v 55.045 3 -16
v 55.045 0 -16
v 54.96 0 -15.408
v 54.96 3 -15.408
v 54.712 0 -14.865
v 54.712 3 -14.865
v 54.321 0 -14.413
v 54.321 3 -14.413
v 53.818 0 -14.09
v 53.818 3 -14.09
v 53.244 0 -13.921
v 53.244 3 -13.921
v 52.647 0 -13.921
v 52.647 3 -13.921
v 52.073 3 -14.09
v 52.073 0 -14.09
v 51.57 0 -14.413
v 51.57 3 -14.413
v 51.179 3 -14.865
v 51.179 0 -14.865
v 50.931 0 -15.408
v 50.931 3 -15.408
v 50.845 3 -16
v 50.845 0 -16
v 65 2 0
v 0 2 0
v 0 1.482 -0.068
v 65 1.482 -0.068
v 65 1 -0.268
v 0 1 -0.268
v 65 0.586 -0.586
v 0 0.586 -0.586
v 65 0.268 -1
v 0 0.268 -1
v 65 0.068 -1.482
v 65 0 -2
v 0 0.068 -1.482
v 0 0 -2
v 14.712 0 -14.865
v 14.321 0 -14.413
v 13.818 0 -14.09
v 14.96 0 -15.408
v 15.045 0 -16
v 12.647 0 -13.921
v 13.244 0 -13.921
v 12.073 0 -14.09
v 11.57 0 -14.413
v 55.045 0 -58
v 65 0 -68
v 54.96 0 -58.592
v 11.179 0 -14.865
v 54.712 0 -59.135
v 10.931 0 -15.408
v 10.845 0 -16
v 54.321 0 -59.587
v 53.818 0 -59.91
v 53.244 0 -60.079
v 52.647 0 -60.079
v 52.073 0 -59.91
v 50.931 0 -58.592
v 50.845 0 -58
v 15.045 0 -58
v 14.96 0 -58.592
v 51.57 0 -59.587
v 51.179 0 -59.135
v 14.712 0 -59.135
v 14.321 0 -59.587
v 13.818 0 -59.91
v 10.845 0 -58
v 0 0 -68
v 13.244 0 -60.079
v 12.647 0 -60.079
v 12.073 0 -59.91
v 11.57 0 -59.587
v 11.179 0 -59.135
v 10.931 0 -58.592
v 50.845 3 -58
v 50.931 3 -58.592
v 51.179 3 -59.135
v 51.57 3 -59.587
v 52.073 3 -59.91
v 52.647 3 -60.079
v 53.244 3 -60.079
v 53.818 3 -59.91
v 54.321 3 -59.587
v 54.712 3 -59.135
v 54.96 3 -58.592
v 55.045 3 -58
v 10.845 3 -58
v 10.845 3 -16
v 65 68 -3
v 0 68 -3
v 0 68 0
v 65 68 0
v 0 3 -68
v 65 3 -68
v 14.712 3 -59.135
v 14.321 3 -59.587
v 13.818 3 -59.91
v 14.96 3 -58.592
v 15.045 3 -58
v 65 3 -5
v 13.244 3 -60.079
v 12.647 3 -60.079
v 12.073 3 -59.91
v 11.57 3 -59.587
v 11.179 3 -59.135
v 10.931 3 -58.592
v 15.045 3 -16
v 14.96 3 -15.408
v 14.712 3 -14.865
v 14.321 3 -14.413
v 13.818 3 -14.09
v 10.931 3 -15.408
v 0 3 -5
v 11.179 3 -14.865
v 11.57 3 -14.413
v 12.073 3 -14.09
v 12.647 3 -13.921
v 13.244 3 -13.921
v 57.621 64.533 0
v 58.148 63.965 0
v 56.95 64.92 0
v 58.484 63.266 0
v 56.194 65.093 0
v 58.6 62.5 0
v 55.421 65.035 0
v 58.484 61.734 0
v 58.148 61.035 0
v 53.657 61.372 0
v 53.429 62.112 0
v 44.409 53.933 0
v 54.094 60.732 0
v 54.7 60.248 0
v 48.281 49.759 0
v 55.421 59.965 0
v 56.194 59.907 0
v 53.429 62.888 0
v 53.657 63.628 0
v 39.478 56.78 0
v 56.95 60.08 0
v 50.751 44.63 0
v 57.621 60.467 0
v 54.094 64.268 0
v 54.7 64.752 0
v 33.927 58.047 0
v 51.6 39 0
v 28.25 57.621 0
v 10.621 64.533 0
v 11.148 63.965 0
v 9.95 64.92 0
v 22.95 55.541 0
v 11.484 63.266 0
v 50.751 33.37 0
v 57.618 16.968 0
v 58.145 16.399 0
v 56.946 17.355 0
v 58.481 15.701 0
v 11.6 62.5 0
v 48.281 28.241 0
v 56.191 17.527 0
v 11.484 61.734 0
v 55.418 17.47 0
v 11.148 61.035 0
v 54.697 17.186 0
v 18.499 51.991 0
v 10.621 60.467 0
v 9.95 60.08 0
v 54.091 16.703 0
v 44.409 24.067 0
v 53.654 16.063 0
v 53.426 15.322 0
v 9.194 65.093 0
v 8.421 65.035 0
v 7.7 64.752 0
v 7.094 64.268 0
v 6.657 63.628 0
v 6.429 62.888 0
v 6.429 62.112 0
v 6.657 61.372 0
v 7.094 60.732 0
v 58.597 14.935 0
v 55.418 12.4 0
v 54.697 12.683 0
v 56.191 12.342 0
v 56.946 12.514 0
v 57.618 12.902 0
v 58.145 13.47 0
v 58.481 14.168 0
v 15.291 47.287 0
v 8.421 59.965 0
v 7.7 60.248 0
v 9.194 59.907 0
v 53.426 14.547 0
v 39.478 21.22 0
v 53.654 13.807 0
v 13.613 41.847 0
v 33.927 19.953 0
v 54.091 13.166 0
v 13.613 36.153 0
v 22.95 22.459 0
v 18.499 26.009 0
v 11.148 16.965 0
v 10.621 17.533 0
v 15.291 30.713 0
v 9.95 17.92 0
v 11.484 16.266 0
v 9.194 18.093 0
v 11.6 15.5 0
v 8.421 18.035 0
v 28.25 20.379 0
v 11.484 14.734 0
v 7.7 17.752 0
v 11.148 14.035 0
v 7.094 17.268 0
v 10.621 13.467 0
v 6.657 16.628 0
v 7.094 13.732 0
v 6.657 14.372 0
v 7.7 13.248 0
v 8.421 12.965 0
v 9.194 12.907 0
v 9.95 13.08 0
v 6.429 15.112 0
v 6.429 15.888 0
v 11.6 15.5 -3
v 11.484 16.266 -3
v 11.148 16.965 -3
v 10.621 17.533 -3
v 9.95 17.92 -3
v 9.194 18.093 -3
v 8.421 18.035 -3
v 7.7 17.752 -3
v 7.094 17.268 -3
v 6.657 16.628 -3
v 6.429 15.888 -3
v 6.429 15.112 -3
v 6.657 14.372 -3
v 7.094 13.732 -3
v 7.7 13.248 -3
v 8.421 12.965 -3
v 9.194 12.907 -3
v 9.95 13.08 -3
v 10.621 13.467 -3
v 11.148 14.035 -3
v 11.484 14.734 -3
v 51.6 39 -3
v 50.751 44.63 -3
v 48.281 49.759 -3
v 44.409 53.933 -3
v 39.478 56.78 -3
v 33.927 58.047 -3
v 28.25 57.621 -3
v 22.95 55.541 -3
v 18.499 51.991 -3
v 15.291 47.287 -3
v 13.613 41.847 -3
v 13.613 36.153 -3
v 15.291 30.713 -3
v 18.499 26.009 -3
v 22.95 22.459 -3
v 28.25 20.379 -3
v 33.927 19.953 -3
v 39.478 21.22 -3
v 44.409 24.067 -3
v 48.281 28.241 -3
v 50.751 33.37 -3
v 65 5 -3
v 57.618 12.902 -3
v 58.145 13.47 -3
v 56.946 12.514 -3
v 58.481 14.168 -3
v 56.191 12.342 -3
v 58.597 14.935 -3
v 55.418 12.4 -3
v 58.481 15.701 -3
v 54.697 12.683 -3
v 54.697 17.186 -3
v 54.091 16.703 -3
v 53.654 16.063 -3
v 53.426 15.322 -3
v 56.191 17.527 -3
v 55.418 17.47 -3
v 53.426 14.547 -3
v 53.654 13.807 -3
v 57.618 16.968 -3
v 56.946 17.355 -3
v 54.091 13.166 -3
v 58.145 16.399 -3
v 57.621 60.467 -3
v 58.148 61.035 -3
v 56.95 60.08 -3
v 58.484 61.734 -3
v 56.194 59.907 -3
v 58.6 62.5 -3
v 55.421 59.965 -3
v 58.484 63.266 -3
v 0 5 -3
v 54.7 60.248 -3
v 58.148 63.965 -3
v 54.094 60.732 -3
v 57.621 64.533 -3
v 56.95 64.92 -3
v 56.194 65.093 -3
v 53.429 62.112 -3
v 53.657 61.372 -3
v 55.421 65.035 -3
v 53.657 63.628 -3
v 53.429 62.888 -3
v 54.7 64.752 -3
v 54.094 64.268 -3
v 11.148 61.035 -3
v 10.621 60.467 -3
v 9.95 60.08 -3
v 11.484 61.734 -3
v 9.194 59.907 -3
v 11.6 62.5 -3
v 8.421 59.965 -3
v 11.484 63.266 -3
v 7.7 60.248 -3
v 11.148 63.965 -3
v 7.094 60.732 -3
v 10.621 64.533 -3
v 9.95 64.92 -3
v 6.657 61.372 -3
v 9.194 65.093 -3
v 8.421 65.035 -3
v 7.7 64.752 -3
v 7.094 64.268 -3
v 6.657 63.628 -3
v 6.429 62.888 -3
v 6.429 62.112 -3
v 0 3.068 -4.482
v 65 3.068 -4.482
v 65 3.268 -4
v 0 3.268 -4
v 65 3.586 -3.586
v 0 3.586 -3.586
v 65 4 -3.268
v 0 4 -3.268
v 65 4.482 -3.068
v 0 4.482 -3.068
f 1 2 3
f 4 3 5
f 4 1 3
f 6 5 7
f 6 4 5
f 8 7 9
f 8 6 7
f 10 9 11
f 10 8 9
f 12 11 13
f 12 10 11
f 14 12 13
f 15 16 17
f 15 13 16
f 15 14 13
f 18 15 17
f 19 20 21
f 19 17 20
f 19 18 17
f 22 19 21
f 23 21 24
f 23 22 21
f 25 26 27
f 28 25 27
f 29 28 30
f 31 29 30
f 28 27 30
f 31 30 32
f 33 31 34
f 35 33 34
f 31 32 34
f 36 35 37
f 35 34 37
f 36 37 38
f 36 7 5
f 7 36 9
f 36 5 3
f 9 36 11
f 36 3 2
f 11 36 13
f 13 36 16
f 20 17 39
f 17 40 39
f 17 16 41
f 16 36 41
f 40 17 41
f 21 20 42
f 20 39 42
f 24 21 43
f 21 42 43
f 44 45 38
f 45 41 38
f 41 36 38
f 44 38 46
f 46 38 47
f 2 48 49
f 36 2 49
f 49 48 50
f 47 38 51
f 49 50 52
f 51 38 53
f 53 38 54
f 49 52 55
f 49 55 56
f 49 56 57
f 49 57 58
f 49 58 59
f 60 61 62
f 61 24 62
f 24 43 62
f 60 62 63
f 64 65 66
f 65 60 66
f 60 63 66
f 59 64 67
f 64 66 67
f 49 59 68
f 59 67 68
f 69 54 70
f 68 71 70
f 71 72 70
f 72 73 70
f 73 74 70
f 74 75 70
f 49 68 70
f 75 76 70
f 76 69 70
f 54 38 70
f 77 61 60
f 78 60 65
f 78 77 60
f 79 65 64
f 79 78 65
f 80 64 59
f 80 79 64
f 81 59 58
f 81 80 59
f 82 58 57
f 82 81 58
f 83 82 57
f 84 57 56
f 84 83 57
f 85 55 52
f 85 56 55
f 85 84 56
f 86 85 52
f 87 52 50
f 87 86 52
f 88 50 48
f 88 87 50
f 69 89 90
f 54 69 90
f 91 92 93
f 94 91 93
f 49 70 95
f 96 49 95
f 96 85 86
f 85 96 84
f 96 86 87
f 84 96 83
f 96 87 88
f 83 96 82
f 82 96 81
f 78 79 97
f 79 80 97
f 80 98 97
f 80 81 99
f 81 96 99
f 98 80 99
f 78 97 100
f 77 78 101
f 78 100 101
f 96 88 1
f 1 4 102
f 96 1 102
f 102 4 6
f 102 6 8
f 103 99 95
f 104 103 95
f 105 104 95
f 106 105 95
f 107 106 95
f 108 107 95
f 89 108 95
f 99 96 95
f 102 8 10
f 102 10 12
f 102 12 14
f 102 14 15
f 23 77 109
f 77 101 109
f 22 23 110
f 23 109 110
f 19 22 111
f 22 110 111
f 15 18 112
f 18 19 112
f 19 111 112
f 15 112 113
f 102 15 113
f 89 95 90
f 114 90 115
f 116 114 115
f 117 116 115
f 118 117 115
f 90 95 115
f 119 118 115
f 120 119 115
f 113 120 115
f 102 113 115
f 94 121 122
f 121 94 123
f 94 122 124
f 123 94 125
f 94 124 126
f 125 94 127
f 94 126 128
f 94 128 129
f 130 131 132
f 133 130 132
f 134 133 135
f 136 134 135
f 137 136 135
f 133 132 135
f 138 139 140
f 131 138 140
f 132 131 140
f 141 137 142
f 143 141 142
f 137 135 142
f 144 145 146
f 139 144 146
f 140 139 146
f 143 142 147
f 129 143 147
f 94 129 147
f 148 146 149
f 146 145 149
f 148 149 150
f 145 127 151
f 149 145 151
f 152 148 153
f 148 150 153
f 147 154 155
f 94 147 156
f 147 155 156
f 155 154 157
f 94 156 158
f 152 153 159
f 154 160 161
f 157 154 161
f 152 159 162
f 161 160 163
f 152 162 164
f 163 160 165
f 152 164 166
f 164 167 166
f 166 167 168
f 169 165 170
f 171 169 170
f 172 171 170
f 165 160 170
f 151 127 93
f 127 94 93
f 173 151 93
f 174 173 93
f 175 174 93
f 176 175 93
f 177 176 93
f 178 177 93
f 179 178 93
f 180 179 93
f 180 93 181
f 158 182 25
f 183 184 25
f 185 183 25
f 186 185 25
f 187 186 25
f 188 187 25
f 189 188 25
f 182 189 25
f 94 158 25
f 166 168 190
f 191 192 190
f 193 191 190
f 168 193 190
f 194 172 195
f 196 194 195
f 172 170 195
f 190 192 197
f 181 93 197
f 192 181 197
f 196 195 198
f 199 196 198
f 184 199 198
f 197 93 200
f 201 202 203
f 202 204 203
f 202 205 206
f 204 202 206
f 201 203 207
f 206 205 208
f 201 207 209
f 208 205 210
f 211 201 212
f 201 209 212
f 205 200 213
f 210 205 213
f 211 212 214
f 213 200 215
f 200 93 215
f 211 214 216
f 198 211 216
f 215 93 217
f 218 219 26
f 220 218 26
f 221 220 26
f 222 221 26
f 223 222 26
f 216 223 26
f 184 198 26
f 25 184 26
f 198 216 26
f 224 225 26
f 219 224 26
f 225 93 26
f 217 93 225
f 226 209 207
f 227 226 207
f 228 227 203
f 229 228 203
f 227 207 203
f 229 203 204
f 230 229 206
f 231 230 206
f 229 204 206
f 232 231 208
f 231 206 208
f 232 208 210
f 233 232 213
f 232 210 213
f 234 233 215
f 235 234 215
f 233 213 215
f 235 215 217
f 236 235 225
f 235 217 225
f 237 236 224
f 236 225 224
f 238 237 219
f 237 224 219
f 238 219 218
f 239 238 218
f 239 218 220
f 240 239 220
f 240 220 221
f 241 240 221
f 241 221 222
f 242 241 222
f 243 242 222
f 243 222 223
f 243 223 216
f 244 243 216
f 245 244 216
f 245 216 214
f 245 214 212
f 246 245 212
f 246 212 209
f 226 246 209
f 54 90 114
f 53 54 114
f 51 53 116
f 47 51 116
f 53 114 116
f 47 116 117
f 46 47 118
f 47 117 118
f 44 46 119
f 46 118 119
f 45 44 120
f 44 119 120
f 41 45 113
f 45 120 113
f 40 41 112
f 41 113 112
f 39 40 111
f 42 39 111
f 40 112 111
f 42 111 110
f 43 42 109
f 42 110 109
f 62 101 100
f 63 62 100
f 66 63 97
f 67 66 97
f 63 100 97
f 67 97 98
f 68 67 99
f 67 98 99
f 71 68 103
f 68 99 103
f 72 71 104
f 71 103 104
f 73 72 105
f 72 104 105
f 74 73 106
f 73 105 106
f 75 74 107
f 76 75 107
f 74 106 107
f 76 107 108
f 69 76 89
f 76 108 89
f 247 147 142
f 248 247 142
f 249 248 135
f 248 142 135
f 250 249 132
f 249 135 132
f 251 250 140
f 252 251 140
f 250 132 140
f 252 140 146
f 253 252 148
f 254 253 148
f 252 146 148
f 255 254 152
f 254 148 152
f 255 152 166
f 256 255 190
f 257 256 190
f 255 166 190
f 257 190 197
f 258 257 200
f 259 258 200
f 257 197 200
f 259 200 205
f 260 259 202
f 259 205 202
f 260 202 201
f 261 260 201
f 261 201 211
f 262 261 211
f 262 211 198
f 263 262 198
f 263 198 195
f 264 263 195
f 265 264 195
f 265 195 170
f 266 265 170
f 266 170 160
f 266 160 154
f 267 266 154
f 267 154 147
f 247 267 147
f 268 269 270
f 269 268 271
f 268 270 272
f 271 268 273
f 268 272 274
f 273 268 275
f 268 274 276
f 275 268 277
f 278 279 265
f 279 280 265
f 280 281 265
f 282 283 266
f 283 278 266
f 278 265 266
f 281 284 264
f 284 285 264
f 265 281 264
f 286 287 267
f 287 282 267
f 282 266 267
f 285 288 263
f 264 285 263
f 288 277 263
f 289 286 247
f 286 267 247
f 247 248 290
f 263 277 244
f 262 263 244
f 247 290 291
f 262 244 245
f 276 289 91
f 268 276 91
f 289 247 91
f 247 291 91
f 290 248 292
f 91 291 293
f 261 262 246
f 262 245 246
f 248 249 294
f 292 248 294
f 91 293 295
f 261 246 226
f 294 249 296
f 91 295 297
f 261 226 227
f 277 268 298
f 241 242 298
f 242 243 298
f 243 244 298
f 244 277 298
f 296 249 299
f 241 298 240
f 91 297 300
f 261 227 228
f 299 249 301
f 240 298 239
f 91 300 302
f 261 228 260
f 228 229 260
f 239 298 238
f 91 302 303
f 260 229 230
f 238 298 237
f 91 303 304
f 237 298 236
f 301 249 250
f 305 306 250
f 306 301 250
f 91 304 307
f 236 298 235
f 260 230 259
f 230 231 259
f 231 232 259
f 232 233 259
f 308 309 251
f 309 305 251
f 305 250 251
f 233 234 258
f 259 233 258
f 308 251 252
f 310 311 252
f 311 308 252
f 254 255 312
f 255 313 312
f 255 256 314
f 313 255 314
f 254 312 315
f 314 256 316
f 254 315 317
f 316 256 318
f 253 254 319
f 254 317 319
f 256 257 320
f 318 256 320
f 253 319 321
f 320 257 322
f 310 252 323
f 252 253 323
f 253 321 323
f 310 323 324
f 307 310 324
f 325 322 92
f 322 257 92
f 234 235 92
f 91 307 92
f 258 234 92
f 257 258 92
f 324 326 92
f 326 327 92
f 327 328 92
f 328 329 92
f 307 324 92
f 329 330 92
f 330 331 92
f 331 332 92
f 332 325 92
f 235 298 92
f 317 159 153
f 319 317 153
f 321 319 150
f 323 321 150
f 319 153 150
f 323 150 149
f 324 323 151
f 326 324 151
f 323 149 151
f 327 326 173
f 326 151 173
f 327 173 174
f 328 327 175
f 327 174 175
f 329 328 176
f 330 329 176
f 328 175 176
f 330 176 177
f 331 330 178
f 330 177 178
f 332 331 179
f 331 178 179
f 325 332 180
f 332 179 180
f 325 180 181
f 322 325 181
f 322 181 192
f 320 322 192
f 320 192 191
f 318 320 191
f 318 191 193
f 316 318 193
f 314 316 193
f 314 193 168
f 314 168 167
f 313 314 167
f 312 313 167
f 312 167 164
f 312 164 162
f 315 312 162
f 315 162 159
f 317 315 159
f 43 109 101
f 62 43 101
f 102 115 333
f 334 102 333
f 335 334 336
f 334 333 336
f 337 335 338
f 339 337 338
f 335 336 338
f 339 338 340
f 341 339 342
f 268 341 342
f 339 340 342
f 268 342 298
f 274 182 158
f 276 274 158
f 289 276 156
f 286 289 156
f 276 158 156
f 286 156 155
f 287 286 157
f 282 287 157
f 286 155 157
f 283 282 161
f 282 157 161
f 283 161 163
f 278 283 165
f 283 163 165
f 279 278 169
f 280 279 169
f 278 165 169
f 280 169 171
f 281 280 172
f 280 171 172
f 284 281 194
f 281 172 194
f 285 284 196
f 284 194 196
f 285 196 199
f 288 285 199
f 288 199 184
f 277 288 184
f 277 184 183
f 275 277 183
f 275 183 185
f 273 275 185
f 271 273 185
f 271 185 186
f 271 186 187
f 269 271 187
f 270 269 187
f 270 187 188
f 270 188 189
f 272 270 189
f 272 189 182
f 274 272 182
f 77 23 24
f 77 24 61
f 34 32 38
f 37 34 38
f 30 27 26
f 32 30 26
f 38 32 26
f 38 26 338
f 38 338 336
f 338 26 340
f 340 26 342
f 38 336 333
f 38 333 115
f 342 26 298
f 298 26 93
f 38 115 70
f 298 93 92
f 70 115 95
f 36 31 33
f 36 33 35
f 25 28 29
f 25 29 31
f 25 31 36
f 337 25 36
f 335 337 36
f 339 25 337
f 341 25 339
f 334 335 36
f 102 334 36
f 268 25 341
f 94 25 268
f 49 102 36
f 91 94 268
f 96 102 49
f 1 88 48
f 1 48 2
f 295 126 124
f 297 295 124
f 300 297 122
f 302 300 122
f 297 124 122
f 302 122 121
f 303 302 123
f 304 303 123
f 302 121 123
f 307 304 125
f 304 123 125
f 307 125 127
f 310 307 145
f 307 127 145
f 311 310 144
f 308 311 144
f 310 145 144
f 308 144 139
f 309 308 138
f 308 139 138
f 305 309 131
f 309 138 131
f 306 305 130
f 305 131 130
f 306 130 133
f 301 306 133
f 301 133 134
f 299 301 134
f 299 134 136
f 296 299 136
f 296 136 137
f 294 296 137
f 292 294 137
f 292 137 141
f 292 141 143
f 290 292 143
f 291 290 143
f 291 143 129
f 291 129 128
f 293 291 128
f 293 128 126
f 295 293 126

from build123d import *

# Parameters (mm, degrees)
EXTRUDE_1_DEPTH     = 65
CUT_EXTRUDE_1_DEPTH = 115.341593482
SKETCH_3_R          = 19.1
SKETCH_3_R_2        = 2.6
CUT_EXTRUDE_2_DEPTH = 117.073252733


with BuildPart() as part:
    # Эскиз1 → Бобышка-Вытянуть1 (new body)
    with BuildSketch(Plane(origin=(0, 0, 0), x_dir=(0, 0, -1), z_dir=(1, 0, 0))):
        with BuildLine():
            Line((0, 68), (0, 2))
            ThreePointArc((0, 2), (0.585786438, 0.585786438), (2, 0))
            Line((2, 0), (68, 0))
            Line((68, 0), (68, 3))
            Line((68, 3), (5, 3))
            ThreePointArc((5, 3), (3.585786438, 3.585786438), (3, 5))
            Line((3, 5), (3, 68))
            Line((3, 68), (0, 68))
        make_face()
    extrude(amount=EXTRUDE_1_DEPTH)

    # Эскиз2 → Вырез-Вытянуть1 (cut, through all)
    with BuildSketch(Plane(origin=(0, 3, 0), x_dir=(1, 0, 0), z_dir=(0, 1, 0))):
        with BuildLine():
            Line((55.045453811, 58), (55.045453811, 16))
            ThreePointArc((55.045453811, 16), (52.945453811, 13.9), (50.845453811, 16))
            Line((50.845453811, 16), (50.845453811, 58))
            ThreePointArc((50.845453811, 58), (52.945453811, 60.1), (55.045453811, 58))
        make_face()
        with BuildLine():
            Line((10.845453811, 58), (10.845453811, 16))
            ThreePointArc((10.845453811, 16), (12.945453811, 13.9), (15.045453811, 16))
            Line((15.045453811, 16), (15.045453811, 58))
            ThreePointArc((15.045453811, 58), (12.945453811, 60.1), (10.845453811, 58))
        make_face()
    extrude(amount=-CUT_EXTRUDE_1_DEPTH, mode=Mode.SUBTRACT)

    # Эскиз3 → Вырез-Вытянуть2 (cut, through all)
    with BuildSketch(Plane.XY):
        with Locations((32.5, 39)):
            Circle(SKETCH_3_R)
        with Locations((9, 62.5)):
            Circle(SKETCH_3_R_2)
        with Locations((56, 62.5)):
            Circle(SKETCH_3_R_2)
        with Locations((55.996600846, 14.934748787)):
            Circle(SKETCH_3_R_2)
        with Locations((9, 15.5)):
            Circle(SKETCH_3_R_2)
    extrude(amount=-CUT_EXTRUDE_2_DEPTH, mode=Mode.SUBTRACT)


solid = part.part
